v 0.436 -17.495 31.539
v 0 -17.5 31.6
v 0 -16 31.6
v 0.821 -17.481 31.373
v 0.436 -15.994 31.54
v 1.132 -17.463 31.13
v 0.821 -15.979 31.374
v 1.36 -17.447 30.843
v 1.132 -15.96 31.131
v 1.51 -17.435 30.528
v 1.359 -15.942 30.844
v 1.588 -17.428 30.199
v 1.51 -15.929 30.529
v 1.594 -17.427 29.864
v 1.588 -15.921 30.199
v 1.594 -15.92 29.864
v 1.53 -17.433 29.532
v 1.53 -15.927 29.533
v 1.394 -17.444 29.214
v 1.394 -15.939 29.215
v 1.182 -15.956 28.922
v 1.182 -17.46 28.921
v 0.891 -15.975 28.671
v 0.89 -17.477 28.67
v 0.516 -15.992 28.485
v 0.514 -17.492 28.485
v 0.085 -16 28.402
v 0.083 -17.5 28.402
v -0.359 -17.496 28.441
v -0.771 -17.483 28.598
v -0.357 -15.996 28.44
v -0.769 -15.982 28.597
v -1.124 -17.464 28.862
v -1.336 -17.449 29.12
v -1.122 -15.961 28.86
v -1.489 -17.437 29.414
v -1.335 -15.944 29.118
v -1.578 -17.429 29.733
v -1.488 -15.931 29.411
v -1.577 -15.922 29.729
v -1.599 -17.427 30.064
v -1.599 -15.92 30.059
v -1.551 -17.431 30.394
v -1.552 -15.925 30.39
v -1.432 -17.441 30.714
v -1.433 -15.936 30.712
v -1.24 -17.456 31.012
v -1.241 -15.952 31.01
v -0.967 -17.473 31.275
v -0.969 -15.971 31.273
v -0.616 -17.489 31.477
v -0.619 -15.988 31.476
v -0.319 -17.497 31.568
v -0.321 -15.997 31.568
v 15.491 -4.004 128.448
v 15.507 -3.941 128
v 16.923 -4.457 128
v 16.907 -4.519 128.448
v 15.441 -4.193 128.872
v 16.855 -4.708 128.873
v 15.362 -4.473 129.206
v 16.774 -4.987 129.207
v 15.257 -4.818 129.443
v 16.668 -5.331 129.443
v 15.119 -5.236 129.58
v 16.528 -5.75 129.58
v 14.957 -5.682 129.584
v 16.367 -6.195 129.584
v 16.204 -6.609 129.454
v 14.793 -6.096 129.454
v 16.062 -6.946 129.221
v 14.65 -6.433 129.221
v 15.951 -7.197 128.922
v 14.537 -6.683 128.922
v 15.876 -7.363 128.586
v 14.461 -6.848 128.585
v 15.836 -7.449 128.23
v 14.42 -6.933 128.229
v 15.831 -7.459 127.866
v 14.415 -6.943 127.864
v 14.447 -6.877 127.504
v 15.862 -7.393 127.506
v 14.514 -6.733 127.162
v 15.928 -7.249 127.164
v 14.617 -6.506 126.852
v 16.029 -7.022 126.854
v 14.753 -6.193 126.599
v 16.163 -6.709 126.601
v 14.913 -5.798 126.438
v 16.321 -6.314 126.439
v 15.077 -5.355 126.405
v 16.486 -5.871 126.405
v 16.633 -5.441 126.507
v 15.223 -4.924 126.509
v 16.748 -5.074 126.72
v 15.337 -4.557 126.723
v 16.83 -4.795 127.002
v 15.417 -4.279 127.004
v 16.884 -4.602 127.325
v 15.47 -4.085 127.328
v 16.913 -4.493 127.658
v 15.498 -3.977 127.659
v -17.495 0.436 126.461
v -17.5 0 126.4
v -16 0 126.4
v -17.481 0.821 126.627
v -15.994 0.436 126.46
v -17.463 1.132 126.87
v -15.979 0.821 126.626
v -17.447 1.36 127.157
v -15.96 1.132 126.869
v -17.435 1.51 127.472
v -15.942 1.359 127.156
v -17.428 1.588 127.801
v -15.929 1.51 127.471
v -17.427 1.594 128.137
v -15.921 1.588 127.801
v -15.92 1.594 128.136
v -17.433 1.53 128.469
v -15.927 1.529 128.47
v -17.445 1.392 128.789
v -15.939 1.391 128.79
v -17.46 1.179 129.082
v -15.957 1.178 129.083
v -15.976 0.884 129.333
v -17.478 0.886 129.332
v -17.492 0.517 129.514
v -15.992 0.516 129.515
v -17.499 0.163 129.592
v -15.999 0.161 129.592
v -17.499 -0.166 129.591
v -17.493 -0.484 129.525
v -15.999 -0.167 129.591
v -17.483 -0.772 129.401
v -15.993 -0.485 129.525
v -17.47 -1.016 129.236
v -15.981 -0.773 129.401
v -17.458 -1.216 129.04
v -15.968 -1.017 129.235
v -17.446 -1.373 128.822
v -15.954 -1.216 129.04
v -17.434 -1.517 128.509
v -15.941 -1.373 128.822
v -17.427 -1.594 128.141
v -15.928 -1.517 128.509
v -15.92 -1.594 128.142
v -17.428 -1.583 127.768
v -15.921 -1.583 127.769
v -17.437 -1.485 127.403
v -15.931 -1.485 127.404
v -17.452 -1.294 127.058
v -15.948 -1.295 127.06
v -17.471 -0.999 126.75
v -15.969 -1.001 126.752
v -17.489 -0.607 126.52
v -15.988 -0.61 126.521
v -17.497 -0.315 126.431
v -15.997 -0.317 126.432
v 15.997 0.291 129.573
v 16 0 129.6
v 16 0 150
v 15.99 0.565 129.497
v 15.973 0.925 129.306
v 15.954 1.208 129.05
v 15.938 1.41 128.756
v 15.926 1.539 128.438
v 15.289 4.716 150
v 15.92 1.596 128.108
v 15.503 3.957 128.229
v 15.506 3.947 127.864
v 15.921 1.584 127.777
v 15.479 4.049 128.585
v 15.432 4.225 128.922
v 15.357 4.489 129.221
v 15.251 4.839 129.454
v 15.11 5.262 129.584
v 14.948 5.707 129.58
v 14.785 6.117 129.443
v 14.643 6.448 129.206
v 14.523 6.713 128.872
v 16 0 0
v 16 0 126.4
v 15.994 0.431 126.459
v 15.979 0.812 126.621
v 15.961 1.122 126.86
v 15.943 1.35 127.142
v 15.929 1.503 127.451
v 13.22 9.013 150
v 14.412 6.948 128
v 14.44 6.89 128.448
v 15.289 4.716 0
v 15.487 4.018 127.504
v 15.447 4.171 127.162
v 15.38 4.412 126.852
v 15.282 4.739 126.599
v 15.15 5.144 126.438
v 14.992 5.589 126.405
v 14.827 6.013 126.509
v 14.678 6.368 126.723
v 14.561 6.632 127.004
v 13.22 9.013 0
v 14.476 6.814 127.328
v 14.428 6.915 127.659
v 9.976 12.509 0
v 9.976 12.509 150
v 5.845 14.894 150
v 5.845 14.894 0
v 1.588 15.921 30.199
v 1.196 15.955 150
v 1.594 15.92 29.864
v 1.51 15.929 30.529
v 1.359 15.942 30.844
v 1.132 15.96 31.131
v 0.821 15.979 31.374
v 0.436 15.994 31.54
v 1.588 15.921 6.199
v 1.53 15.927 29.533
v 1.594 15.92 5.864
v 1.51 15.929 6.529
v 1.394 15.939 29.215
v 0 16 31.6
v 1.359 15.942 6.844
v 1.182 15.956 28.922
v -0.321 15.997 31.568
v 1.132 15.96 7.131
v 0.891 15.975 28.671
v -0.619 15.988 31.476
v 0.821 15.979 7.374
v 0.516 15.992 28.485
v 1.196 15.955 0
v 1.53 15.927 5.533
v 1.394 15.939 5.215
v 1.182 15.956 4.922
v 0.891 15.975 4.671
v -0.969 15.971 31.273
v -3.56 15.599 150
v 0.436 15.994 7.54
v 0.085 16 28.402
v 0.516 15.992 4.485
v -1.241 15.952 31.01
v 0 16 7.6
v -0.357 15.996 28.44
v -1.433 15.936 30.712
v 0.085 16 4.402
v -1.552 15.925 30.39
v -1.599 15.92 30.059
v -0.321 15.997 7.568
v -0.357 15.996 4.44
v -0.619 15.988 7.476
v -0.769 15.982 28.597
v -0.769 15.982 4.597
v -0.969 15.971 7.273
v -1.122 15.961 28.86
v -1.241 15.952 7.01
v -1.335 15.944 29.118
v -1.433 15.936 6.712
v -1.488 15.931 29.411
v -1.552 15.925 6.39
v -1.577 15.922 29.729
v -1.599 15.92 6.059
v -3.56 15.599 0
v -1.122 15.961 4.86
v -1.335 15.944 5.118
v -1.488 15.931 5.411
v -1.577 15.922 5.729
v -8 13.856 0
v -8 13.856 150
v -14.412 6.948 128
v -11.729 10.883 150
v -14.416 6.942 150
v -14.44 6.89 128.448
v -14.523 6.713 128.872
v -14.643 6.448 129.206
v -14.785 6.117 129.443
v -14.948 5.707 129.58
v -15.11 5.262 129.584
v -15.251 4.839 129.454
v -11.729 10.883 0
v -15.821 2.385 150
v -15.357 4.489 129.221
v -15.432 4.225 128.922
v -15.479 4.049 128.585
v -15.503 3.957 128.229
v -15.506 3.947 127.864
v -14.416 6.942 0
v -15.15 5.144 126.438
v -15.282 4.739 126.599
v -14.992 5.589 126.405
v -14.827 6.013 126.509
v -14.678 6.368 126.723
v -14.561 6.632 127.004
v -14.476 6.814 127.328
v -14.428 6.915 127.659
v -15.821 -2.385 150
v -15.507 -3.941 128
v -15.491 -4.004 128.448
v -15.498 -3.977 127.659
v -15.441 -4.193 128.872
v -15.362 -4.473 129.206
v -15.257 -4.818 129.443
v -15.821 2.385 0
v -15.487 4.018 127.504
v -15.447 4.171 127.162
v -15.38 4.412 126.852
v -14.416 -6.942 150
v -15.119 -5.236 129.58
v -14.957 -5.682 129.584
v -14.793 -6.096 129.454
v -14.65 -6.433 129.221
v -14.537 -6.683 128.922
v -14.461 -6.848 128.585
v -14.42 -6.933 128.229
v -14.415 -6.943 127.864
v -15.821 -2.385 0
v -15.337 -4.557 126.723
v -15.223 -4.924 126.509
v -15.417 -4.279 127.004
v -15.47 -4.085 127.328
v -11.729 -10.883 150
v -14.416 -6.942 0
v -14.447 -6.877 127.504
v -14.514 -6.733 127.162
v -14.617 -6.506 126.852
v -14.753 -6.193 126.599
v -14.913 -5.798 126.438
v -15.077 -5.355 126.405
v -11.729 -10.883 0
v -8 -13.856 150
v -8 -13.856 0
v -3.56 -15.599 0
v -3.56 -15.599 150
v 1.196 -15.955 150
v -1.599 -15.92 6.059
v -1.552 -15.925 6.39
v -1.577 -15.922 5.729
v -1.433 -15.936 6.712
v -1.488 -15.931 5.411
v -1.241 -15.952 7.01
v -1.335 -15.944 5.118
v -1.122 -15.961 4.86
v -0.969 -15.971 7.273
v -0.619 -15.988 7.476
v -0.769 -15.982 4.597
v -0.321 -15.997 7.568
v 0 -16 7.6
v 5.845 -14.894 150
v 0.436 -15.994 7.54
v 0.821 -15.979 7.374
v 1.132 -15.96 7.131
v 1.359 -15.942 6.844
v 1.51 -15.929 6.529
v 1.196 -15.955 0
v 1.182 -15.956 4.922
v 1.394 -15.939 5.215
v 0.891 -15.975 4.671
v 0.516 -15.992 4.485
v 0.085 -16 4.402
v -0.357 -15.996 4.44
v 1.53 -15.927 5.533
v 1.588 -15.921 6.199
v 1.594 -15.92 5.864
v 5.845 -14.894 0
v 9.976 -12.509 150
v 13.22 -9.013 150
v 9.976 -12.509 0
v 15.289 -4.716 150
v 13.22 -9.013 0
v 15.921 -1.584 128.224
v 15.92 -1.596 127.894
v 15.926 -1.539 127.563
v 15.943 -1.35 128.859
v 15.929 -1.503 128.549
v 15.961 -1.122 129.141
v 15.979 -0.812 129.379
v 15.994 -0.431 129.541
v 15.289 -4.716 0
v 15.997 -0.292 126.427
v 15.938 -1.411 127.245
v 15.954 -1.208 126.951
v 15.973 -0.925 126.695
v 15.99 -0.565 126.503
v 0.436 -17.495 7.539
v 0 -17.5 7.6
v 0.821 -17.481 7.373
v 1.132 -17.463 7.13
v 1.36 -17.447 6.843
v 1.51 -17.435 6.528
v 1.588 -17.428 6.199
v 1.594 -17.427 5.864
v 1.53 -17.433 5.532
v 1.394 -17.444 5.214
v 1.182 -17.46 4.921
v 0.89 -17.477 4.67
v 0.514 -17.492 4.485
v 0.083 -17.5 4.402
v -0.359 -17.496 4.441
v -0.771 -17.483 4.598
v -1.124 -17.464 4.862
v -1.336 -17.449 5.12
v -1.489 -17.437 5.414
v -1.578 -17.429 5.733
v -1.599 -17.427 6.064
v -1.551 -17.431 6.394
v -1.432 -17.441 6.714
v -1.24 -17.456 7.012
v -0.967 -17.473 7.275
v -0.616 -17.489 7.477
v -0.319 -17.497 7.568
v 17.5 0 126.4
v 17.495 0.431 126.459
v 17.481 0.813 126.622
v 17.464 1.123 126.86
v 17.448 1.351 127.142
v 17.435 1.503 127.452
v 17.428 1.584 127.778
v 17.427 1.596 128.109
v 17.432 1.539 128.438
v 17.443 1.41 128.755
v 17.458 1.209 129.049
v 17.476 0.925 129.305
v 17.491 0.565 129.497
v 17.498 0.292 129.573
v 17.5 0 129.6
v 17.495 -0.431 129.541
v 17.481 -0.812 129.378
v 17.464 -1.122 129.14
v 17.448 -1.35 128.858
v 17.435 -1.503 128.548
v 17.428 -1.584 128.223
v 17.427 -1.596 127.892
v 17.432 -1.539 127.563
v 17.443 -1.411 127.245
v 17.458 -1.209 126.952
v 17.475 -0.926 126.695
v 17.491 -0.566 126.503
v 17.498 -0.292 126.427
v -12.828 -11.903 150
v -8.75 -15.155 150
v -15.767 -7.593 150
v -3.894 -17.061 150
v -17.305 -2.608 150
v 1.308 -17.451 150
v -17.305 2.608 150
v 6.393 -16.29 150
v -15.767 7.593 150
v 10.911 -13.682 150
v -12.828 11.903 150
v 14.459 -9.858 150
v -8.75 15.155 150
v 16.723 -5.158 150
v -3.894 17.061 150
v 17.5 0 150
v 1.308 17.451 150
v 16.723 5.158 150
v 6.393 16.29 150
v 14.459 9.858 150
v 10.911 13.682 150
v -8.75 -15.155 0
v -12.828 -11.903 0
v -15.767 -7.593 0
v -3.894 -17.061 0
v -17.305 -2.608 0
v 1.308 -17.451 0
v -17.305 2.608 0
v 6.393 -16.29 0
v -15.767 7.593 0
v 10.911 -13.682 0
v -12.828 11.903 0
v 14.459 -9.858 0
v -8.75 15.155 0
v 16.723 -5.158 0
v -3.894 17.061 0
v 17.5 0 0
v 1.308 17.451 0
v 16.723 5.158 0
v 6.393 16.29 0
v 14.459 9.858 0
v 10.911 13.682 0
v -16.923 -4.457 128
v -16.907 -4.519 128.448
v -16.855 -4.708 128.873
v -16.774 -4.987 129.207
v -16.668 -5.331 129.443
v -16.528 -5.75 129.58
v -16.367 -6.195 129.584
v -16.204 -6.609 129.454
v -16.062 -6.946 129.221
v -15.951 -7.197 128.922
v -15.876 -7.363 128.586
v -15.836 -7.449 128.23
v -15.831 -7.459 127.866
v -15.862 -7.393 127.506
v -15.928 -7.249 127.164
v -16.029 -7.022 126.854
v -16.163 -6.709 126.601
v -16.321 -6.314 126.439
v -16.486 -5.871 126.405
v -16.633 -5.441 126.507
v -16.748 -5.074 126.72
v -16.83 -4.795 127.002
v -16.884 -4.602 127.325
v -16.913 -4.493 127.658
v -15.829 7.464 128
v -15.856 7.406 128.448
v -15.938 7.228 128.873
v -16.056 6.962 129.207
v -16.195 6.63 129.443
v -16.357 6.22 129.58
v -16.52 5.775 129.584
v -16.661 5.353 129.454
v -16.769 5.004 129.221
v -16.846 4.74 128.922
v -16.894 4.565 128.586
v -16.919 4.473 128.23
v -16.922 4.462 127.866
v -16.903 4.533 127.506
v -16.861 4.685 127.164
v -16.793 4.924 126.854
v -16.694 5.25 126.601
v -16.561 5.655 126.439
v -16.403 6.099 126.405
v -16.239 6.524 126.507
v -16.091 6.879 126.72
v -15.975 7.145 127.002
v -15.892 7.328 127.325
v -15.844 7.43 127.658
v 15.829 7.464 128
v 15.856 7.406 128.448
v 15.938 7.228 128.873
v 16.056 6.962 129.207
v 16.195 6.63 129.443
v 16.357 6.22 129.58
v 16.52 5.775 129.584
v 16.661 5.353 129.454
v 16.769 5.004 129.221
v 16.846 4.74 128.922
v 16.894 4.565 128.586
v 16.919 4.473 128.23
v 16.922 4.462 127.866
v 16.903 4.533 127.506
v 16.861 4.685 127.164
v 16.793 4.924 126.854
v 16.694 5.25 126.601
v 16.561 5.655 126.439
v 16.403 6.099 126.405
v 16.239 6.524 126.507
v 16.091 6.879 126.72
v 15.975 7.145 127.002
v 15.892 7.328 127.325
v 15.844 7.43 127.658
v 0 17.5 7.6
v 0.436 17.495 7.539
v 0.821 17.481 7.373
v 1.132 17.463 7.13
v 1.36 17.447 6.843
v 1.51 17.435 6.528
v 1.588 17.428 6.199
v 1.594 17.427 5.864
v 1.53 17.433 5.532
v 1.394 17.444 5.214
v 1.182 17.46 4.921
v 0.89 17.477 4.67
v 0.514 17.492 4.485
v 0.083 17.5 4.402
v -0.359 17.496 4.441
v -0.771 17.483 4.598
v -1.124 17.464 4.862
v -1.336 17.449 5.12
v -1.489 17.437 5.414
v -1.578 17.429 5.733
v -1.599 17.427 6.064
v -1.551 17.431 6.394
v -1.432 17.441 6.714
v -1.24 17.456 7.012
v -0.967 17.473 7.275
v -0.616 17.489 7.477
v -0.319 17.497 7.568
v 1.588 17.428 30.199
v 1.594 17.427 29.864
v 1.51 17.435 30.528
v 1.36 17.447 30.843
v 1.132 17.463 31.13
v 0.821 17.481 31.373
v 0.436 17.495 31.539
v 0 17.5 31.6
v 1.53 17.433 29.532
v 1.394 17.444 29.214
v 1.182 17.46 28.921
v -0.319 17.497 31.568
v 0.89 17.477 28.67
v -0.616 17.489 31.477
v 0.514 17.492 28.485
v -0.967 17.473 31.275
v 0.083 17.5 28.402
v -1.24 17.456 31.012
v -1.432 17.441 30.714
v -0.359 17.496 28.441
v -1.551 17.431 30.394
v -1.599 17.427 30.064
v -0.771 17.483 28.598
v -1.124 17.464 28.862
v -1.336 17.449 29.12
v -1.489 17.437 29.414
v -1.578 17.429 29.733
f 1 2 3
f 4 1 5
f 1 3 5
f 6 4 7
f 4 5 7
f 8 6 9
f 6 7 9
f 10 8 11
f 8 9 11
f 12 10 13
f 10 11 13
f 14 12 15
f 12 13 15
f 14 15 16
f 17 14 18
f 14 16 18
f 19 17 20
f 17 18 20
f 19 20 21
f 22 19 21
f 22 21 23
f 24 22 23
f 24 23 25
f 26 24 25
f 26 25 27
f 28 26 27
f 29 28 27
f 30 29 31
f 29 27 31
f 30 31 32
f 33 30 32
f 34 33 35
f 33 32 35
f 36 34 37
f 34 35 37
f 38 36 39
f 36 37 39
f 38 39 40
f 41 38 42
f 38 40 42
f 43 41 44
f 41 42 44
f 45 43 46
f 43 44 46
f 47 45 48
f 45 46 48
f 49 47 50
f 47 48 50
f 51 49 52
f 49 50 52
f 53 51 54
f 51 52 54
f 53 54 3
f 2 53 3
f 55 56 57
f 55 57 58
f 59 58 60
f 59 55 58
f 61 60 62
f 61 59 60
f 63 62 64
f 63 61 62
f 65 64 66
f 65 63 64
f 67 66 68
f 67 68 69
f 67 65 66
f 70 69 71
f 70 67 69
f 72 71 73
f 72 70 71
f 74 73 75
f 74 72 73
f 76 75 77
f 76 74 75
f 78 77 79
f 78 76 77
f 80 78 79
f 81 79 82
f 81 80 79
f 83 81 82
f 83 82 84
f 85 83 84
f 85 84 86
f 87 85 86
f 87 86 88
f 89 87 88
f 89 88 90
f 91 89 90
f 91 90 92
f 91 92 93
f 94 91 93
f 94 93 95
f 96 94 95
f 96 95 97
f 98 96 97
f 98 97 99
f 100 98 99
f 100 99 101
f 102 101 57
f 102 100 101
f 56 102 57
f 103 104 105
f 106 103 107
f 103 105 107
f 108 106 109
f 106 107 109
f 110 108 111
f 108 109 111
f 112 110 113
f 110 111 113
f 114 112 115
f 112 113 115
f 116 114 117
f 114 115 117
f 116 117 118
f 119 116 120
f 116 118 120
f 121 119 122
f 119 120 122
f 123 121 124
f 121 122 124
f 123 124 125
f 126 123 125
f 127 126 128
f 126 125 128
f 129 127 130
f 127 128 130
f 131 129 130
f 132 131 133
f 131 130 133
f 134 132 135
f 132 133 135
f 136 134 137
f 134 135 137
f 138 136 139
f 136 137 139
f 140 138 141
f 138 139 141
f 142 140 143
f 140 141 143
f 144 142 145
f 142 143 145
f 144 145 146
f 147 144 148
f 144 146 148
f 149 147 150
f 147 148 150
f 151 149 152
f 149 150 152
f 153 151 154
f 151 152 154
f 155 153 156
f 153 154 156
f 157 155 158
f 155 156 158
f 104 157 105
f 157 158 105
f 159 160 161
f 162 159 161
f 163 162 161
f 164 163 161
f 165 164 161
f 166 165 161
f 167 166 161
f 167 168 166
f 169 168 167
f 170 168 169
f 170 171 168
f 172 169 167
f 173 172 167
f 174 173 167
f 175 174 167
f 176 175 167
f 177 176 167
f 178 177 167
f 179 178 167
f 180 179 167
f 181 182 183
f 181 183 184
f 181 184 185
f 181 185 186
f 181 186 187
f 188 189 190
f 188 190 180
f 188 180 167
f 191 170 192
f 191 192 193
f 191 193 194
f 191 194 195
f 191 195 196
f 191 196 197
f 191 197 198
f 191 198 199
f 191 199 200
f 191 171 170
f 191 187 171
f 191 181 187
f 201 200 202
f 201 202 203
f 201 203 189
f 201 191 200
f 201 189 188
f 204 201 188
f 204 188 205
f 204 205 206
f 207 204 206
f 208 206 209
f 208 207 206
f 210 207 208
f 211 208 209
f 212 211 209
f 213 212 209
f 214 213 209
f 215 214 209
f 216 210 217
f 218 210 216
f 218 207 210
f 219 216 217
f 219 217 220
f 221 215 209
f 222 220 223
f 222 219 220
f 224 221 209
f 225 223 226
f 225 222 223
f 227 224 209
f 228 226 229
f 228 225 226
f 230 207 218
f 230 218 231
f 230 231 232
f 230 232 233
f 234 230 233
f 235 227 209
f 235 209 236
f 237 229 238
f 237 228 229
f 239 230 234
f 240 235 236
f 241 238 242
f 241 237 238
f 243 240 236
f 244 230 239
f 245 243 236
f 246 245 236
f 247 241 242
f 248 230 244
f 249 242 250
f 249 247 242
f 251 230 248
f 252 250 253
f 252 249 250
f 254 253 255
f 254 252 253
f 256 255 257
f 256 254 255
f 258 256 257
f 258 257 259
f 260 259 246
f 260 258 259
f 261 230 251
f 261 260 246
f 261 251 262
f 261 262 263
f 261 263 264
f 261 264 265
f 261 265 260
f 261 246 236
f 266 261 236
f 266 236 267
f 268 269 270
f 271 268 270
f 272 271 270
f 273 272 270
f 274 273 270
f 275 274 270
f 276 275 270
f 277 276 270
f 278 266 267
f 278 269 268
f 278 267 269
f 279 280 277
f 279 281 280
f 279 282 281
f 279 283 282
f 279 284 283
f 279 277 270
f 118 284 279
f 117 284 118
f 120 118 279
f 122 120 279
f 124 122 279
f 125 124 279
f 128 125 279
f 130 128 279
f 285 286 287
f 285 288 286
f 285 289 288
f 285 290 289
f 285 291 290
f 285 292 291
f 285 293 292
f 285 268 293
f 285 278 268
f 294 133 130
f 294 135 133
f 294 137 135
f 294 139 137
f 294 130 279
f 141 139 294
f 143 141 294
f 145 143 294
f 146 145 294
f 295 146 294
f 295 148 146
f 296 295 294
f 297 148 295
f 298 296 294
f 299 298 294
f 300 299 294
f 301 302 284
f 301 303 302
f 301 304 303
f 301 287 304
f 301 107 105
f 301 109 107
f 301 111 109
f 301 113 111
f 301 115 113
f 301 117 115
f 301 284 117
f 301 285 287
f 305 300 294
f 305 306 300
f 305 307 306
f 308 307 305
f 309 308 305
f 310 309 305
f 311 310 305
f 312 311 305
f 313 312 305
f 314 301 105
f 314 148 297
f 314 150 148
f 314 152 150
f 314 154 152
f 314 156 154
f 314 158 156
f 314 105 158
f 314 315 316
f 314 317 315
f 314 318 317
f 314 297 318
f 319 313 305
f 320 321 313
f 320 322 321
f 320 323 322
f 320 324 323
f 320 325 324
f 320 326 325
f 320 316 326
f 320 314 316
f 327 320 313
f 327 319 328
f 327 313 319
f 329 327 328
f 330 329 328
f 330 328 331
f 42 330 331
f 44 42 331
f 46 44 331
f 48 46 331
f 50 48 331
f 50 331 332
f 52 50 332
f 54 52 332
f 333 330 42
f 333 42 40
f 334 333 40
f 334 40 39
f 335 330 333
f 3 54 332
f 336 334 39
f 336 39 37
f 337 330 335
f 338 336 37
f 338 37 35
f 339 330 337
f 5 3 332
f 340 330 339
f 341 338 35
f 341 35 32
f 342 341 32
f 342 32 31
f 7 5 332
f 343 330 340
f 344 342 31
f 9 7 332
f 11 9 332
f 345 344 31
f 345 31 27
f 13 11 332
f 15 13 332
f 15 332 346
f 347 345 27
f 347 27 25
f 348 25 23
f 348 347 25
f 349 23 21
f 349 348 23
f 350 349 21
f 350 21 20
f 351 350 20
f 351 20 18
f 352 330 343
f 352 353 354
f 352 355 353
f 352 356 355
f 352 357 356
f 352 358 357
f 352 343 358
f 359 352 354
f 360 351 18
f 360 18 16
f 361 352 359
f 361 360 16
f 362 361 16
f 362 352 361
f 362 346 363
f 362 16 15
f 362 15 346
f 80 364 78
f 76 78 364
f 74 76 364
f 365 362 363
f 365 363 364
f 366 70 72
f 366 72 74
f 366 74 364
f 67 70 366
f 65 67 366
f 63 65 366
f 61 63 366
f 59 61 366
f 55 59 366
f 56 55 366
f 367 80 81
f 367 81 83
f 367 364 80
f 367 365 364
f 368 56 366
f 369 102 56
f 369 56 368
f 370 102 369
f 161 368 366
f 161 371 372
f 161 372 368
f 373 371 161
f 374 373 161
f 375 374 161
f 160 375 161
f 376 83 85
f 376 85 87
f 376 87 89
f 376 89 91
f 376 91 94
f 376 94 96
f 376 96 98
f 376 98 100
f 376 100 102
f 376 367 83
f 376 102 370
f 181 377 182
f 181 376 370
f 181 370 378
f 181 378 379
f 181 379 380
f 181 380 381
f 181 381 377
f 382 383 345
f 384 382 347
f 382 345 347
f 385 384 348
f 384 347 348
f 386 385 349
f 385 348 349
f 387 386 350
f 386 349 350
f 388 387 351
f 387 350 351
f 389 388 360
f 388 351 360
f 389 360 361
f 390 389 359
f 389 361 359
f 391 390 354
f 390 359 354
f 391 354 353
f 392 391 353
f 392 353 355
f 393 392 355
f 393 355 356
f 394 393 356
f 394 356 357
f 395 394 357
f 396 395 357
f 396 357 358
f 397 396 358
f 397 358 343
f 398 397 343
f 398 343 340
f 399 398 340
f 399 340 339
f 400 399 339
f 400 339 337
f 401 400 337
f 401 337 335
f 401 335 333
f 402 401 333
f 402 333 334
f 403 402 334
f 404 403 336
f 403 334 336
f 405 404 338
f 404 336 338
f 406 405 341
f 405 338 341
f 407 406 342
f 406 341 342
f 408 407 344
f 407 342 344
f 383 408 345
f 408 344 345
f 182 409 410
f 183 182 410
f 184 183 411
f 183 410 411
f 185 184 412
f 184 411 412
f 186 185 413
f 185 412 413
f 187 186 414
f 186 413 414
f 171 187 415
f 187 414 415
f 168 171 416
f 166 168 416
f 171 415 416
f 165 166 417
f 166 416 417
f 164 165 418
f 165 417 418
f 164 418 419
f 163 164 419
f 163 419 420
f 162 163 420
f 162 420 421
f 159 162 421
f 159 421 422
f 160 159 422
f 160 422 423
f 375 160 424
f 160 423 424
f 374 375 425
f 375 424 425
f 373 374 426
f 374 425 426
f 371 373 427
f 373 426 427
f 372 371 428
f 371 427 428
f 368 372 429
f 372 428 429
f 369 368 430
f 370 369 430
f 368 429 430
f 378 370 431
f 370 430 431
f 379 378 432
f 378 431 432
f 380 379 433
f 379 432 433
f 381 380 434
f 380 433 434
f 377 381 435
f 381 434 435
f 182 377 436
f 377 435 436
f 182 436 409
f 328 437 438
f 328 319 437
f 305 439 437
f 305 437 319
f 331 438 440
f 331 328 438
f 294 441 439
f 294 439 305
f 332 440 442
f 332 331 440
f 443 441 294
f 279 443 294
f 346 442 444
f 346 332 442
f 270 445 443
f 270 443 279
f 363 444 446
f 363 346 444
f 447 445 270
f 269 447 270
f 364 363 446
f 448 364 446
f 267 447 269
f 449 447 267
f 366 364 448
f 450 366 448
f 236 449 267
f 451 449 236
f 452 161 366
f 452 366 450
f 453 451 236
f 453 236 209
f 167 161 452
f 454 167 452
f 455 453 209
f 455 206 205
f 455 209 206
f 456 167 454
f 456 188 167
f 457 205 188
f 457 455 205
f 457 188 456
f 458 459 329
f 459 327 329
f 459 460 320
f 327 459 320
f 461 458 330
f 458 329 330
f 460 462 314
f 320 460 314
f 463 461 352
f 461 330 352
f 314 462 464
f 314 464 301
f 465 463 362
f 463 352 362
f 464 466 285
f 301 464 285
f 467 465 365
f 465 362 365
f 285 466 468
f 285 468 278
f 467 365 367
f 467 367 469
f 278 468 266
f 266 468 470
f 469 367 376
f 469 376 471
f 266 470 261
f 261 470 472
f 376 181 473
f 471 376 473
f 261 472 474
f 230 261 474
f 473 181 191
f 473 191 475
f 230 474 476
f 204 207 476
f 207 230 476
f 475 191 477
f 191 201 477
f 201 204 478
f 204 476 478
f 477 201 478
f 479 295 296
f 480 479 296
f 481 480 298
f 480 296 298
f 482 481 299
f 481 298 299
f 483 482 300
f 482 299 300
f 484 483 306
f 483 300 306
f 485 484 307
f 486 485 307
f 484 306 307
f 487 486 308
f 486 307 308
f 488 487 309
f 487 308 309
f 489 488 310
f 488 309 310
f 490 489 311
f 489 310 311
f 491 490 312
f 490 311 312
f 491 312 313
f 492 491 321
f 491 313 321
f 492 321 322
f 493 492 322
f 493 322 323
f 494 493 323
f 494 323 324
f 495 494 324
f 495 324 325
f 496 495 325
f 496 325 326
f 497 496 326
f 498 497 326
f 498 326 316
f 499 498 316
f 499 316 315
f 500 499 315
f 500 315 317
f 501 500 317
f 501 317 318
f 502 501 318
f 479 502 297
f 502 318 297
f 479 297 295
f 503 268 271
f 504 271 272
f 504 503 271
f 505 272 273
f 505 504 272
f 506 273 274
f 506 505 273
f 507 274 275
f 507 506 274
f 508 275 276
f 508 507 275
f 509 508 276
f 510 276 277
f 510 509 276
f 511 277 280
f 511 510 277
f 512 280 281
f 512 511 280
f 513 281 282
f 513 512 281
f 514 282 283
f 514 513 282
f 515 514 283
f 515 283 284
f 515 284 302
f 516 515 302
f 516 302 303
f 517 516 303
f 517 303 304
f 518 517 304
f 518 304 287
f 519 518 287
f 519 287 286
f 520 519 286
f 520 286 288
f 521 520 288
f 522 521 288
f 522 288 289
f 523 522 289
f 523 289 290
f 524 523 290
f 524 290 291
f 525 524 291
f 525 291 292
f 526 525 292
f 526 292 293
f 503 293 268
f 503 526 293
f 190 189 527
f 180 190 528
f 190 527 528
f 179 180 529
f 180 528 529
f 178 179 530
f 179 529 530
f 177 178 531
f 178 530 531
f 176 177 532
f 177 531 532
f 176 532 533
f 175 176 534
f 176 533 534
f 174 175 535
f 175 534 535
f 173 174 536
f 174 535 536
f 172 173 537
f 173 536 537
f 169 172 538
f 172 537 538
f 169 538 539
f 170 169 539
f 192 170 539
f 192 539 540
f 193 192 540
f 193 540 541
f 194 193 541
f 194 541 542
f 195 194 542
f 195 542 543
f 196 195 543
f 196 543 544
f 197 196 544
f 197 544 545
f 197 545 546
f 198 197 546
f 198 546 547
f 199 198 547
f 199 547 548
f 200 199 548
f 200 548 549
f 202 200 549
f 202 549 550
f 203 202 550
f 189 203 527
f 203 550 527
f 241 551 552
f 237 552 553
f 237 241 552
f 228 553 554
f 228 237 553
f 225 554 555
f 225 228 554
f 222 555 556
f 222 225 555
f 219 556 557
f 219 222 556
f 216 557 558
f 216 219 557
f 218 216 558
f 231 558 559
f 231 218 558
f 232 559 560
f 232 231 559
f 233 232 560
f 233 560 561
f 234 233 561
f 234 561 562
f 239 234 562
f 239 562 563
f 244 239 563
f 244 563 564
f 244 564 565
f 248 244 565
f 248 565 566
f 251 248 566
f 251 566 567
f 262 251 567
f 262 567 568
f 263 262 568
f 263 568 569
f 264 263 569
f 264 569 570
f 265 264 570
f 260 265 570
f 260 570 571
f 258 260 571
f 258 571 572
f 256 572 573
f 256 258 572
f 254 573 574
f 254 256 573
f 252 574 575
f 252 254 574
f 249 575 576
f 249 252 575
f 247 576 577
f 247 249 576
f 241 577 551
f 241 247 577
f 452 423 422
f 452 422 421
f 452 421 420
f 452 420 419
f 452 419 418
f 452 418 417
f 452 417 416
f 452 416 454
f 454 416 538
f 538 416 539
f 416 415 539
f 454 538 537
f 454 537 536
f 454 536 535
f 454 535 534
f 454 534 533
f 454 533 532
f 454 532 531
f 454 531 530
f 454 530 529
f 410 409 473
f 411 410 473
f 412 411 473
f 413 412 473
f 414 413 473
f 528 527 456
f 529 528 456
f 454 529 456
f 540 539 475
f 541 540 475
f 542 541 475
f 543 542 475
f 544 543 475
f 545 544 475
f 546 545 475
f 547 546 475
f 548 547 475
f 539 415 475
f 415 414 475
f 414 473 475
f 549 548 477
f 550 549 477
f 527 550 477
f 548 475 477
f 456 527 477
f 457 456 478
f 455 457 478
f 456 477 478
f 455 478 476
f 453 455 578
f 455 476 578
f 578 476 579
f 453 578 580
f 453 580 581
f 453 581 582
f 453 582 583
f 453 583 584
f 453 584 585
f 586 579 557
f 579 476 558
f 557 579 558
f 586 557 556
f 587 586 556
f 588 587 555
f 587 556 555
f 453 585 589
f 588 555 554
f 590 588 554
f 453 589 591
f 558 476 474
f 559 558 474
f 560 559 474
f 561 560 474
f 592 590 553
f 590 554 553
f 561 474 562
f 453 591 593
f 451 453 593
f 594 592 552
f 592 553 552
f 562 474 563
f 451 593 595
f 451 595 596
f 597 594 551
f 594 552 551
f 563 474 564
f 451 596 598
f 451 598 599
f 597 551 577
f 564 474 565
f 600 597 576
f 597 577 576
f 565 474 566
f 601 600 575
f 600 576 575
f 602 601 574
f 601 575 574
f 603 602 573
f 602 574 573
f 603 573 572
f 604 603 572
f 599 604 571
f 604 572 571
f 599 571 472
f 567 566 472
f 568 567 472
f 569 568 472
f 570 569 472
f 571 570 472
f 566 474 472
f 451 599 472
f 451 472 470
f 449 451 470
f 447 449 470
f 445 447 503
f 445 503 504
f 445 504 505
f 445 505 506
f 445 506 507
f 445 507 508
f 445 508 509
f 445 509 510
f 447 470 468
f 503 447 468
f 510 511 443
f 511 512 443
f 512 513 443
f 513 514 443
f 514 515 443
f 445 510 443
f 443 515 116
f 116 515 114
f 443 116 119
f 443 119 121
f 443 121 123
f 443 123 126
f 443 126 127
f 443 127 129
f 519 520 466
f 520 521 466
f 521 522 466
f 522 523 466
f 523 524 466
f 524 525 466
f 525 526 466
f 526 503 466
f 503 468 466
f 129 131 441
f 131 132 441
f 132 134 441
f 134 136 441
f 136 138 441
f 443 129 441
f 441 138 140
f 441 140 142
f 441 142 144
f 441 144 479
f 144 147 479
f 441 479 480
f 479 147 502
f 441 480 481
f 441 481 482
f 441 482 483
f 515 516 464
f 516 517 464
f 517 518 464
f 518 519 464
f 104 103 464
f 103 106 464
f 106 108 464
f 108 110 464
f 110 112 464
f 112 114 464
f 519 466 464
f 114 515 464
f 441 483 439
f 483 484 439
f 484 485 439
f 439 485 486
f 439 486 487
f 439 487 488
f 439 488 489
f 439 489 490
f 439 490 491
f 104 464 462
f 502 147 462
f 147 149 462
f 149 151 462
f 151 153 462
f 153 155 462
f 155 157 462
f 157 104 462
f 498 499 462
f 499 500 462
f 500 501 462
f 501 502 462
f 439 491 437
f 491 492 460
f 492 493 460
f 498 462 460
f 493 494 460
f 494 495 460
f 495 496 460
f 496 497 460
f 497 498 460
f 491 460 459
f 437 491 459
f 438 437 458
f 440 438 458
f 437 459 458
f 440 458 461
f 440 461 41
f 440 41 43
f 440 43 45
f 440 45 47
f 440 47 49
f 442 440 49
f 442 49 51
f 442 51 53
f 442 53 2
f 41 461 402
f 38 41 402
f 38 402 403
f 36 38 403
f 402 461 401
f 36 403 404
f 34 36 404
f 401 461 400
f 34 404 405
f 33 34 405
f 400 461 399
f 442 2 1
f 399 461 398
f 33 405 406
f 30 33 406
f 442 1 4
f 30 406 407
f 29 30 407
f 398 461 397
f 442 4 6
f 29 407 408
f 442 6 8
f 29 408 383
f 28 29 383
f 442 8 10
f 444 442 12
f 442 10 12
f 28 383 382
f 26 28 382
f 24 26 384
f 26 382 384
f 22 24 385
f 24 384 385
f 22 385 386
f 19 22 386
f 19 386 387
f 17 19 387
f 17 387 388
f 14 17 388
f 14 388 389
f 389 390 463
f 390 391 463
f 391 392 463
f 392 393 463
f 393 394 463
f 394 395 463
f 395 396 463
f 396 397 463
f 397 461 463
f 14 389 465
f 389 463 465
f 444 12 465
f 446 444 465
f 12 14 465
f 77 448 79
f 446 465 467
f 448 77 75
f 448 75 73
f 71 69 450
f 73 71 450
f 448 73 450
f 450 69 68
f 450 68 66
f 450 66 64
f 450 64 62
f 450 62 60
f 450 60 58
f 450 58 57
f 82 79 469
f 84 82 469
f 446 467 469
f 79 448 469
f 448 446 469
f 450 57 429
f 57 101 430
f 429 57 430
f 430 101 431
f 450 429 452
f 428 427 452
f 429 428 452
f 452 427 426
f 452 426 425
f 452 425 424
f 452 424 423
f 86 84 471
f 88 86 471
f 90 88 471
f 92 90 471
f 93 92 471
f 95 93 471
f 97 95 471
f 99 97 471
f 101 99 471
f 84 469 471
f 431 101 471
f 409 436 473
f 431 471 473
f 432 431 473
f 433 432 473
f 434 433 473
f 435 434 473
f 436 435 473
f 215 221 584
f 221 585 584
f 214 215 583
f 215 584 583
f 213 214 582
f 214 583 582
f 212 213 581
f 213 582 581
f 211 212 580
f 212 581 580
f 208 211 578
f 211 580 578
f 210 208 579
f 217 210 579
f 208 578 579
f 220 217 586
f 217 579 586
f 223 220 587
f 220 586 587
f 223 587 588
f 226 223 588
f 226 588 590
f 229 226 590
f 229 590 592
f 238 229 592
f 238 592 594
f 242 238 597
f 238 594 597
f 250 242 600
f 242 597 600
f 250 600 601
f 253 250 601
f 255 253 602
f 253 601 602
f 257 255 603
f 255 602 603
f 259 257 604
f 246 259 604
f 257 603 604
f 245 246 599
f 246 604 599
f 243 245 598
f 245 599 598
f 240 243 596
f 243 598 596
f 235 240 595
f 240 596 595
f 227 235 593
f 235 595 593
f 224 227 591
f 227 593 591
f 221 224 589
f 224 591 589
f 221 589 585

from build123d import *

# Parameters (mm, degrees)
SKETCH_1_R          = 17.5
SKETCH_1_R_2        = 16
EXTRUDE_1_DEPTH     = 150
SKETCH_2_R          = 1.6
CUT_EXTRUDE_1_DEPTH = 25
SKETCH_5_R          = 1.6
CUT_EXTRUDE_3_DEPTH = 138.461236575
SKETCH_6_R          = 1.6
CUT_EXTRUDE_4_DEPTH = 25


with BuildPart() as part:
    # 草图1 → 凸台-拉伸1 (new body)
    with BuildSketch(Plane.XY):
        Circle(SKETCH_1_R)
        Circle(SKETCH_1_R_2, mode=Mode.SUBTRACT)
    extrude(amount=EXTRUDE_1_DEPTH)

    # 草图2 → 切除-拉伸1 (cut, symmetric)
    with BuildSketch(Plane(origin=(0, 0, 0), x_dir=(1, 0, 0), z_dir=(0, 1, 0))):
        with Locations(Location((0, -6, 0), (0, 0, 270))):
            Circle(SKETCH_2_R)
        with Locations(Location((0, -30, 0), (0, 0, 270))):
            Circle(SKETCH_2_R)
    extrude(amount=CUT_EXTRUDE_1_DEPTH, both=True, mode=Mode.SUBTRACT)

    # 草图5 → 切除-拉伸3 (cut, through all)
    with BuildSketch(Plane(origin=(24.979117188, 9.091655135, 128), x_dir=(0.3420201433256663, -0.9396926207859093, 0), z_dir=(0.9396926207859093, 0.3420201433256663, 0))):
        with Locations(Location((0, 0, 0), (0, 0, 180))):
            Circle(SKETCH_5_R)
    cut_extrude_3 = extrude(amount=-CUT_EXTRUDE_3_DEPTH, mode=Mode.SUBTRACT)

    # 镜向1: 切除-拉伸3 across plane
    add(cut_extrude_3.mirror(Plane(origin=(0, 0, 0), x_dir=(0, 0, 1), z_dir=(1, 0, 0))), mode=Mode.SUBTRACT)

    # 草图6 → 切除-拉伸4 (cut, symmetric)
    with BuildSketch(Plane(origin=(0, 0, 0), x_dir=(0, 0, -1), z_dir=(1, 0, 0))):
        with Locations((-128, 0)):
            Circle(SKETCH_6_R)
    extrude(amount=CUT_EXTRUDE_4_DEPTH, both=True, mode=Mode.SUBTRACT)


solid = part.part
